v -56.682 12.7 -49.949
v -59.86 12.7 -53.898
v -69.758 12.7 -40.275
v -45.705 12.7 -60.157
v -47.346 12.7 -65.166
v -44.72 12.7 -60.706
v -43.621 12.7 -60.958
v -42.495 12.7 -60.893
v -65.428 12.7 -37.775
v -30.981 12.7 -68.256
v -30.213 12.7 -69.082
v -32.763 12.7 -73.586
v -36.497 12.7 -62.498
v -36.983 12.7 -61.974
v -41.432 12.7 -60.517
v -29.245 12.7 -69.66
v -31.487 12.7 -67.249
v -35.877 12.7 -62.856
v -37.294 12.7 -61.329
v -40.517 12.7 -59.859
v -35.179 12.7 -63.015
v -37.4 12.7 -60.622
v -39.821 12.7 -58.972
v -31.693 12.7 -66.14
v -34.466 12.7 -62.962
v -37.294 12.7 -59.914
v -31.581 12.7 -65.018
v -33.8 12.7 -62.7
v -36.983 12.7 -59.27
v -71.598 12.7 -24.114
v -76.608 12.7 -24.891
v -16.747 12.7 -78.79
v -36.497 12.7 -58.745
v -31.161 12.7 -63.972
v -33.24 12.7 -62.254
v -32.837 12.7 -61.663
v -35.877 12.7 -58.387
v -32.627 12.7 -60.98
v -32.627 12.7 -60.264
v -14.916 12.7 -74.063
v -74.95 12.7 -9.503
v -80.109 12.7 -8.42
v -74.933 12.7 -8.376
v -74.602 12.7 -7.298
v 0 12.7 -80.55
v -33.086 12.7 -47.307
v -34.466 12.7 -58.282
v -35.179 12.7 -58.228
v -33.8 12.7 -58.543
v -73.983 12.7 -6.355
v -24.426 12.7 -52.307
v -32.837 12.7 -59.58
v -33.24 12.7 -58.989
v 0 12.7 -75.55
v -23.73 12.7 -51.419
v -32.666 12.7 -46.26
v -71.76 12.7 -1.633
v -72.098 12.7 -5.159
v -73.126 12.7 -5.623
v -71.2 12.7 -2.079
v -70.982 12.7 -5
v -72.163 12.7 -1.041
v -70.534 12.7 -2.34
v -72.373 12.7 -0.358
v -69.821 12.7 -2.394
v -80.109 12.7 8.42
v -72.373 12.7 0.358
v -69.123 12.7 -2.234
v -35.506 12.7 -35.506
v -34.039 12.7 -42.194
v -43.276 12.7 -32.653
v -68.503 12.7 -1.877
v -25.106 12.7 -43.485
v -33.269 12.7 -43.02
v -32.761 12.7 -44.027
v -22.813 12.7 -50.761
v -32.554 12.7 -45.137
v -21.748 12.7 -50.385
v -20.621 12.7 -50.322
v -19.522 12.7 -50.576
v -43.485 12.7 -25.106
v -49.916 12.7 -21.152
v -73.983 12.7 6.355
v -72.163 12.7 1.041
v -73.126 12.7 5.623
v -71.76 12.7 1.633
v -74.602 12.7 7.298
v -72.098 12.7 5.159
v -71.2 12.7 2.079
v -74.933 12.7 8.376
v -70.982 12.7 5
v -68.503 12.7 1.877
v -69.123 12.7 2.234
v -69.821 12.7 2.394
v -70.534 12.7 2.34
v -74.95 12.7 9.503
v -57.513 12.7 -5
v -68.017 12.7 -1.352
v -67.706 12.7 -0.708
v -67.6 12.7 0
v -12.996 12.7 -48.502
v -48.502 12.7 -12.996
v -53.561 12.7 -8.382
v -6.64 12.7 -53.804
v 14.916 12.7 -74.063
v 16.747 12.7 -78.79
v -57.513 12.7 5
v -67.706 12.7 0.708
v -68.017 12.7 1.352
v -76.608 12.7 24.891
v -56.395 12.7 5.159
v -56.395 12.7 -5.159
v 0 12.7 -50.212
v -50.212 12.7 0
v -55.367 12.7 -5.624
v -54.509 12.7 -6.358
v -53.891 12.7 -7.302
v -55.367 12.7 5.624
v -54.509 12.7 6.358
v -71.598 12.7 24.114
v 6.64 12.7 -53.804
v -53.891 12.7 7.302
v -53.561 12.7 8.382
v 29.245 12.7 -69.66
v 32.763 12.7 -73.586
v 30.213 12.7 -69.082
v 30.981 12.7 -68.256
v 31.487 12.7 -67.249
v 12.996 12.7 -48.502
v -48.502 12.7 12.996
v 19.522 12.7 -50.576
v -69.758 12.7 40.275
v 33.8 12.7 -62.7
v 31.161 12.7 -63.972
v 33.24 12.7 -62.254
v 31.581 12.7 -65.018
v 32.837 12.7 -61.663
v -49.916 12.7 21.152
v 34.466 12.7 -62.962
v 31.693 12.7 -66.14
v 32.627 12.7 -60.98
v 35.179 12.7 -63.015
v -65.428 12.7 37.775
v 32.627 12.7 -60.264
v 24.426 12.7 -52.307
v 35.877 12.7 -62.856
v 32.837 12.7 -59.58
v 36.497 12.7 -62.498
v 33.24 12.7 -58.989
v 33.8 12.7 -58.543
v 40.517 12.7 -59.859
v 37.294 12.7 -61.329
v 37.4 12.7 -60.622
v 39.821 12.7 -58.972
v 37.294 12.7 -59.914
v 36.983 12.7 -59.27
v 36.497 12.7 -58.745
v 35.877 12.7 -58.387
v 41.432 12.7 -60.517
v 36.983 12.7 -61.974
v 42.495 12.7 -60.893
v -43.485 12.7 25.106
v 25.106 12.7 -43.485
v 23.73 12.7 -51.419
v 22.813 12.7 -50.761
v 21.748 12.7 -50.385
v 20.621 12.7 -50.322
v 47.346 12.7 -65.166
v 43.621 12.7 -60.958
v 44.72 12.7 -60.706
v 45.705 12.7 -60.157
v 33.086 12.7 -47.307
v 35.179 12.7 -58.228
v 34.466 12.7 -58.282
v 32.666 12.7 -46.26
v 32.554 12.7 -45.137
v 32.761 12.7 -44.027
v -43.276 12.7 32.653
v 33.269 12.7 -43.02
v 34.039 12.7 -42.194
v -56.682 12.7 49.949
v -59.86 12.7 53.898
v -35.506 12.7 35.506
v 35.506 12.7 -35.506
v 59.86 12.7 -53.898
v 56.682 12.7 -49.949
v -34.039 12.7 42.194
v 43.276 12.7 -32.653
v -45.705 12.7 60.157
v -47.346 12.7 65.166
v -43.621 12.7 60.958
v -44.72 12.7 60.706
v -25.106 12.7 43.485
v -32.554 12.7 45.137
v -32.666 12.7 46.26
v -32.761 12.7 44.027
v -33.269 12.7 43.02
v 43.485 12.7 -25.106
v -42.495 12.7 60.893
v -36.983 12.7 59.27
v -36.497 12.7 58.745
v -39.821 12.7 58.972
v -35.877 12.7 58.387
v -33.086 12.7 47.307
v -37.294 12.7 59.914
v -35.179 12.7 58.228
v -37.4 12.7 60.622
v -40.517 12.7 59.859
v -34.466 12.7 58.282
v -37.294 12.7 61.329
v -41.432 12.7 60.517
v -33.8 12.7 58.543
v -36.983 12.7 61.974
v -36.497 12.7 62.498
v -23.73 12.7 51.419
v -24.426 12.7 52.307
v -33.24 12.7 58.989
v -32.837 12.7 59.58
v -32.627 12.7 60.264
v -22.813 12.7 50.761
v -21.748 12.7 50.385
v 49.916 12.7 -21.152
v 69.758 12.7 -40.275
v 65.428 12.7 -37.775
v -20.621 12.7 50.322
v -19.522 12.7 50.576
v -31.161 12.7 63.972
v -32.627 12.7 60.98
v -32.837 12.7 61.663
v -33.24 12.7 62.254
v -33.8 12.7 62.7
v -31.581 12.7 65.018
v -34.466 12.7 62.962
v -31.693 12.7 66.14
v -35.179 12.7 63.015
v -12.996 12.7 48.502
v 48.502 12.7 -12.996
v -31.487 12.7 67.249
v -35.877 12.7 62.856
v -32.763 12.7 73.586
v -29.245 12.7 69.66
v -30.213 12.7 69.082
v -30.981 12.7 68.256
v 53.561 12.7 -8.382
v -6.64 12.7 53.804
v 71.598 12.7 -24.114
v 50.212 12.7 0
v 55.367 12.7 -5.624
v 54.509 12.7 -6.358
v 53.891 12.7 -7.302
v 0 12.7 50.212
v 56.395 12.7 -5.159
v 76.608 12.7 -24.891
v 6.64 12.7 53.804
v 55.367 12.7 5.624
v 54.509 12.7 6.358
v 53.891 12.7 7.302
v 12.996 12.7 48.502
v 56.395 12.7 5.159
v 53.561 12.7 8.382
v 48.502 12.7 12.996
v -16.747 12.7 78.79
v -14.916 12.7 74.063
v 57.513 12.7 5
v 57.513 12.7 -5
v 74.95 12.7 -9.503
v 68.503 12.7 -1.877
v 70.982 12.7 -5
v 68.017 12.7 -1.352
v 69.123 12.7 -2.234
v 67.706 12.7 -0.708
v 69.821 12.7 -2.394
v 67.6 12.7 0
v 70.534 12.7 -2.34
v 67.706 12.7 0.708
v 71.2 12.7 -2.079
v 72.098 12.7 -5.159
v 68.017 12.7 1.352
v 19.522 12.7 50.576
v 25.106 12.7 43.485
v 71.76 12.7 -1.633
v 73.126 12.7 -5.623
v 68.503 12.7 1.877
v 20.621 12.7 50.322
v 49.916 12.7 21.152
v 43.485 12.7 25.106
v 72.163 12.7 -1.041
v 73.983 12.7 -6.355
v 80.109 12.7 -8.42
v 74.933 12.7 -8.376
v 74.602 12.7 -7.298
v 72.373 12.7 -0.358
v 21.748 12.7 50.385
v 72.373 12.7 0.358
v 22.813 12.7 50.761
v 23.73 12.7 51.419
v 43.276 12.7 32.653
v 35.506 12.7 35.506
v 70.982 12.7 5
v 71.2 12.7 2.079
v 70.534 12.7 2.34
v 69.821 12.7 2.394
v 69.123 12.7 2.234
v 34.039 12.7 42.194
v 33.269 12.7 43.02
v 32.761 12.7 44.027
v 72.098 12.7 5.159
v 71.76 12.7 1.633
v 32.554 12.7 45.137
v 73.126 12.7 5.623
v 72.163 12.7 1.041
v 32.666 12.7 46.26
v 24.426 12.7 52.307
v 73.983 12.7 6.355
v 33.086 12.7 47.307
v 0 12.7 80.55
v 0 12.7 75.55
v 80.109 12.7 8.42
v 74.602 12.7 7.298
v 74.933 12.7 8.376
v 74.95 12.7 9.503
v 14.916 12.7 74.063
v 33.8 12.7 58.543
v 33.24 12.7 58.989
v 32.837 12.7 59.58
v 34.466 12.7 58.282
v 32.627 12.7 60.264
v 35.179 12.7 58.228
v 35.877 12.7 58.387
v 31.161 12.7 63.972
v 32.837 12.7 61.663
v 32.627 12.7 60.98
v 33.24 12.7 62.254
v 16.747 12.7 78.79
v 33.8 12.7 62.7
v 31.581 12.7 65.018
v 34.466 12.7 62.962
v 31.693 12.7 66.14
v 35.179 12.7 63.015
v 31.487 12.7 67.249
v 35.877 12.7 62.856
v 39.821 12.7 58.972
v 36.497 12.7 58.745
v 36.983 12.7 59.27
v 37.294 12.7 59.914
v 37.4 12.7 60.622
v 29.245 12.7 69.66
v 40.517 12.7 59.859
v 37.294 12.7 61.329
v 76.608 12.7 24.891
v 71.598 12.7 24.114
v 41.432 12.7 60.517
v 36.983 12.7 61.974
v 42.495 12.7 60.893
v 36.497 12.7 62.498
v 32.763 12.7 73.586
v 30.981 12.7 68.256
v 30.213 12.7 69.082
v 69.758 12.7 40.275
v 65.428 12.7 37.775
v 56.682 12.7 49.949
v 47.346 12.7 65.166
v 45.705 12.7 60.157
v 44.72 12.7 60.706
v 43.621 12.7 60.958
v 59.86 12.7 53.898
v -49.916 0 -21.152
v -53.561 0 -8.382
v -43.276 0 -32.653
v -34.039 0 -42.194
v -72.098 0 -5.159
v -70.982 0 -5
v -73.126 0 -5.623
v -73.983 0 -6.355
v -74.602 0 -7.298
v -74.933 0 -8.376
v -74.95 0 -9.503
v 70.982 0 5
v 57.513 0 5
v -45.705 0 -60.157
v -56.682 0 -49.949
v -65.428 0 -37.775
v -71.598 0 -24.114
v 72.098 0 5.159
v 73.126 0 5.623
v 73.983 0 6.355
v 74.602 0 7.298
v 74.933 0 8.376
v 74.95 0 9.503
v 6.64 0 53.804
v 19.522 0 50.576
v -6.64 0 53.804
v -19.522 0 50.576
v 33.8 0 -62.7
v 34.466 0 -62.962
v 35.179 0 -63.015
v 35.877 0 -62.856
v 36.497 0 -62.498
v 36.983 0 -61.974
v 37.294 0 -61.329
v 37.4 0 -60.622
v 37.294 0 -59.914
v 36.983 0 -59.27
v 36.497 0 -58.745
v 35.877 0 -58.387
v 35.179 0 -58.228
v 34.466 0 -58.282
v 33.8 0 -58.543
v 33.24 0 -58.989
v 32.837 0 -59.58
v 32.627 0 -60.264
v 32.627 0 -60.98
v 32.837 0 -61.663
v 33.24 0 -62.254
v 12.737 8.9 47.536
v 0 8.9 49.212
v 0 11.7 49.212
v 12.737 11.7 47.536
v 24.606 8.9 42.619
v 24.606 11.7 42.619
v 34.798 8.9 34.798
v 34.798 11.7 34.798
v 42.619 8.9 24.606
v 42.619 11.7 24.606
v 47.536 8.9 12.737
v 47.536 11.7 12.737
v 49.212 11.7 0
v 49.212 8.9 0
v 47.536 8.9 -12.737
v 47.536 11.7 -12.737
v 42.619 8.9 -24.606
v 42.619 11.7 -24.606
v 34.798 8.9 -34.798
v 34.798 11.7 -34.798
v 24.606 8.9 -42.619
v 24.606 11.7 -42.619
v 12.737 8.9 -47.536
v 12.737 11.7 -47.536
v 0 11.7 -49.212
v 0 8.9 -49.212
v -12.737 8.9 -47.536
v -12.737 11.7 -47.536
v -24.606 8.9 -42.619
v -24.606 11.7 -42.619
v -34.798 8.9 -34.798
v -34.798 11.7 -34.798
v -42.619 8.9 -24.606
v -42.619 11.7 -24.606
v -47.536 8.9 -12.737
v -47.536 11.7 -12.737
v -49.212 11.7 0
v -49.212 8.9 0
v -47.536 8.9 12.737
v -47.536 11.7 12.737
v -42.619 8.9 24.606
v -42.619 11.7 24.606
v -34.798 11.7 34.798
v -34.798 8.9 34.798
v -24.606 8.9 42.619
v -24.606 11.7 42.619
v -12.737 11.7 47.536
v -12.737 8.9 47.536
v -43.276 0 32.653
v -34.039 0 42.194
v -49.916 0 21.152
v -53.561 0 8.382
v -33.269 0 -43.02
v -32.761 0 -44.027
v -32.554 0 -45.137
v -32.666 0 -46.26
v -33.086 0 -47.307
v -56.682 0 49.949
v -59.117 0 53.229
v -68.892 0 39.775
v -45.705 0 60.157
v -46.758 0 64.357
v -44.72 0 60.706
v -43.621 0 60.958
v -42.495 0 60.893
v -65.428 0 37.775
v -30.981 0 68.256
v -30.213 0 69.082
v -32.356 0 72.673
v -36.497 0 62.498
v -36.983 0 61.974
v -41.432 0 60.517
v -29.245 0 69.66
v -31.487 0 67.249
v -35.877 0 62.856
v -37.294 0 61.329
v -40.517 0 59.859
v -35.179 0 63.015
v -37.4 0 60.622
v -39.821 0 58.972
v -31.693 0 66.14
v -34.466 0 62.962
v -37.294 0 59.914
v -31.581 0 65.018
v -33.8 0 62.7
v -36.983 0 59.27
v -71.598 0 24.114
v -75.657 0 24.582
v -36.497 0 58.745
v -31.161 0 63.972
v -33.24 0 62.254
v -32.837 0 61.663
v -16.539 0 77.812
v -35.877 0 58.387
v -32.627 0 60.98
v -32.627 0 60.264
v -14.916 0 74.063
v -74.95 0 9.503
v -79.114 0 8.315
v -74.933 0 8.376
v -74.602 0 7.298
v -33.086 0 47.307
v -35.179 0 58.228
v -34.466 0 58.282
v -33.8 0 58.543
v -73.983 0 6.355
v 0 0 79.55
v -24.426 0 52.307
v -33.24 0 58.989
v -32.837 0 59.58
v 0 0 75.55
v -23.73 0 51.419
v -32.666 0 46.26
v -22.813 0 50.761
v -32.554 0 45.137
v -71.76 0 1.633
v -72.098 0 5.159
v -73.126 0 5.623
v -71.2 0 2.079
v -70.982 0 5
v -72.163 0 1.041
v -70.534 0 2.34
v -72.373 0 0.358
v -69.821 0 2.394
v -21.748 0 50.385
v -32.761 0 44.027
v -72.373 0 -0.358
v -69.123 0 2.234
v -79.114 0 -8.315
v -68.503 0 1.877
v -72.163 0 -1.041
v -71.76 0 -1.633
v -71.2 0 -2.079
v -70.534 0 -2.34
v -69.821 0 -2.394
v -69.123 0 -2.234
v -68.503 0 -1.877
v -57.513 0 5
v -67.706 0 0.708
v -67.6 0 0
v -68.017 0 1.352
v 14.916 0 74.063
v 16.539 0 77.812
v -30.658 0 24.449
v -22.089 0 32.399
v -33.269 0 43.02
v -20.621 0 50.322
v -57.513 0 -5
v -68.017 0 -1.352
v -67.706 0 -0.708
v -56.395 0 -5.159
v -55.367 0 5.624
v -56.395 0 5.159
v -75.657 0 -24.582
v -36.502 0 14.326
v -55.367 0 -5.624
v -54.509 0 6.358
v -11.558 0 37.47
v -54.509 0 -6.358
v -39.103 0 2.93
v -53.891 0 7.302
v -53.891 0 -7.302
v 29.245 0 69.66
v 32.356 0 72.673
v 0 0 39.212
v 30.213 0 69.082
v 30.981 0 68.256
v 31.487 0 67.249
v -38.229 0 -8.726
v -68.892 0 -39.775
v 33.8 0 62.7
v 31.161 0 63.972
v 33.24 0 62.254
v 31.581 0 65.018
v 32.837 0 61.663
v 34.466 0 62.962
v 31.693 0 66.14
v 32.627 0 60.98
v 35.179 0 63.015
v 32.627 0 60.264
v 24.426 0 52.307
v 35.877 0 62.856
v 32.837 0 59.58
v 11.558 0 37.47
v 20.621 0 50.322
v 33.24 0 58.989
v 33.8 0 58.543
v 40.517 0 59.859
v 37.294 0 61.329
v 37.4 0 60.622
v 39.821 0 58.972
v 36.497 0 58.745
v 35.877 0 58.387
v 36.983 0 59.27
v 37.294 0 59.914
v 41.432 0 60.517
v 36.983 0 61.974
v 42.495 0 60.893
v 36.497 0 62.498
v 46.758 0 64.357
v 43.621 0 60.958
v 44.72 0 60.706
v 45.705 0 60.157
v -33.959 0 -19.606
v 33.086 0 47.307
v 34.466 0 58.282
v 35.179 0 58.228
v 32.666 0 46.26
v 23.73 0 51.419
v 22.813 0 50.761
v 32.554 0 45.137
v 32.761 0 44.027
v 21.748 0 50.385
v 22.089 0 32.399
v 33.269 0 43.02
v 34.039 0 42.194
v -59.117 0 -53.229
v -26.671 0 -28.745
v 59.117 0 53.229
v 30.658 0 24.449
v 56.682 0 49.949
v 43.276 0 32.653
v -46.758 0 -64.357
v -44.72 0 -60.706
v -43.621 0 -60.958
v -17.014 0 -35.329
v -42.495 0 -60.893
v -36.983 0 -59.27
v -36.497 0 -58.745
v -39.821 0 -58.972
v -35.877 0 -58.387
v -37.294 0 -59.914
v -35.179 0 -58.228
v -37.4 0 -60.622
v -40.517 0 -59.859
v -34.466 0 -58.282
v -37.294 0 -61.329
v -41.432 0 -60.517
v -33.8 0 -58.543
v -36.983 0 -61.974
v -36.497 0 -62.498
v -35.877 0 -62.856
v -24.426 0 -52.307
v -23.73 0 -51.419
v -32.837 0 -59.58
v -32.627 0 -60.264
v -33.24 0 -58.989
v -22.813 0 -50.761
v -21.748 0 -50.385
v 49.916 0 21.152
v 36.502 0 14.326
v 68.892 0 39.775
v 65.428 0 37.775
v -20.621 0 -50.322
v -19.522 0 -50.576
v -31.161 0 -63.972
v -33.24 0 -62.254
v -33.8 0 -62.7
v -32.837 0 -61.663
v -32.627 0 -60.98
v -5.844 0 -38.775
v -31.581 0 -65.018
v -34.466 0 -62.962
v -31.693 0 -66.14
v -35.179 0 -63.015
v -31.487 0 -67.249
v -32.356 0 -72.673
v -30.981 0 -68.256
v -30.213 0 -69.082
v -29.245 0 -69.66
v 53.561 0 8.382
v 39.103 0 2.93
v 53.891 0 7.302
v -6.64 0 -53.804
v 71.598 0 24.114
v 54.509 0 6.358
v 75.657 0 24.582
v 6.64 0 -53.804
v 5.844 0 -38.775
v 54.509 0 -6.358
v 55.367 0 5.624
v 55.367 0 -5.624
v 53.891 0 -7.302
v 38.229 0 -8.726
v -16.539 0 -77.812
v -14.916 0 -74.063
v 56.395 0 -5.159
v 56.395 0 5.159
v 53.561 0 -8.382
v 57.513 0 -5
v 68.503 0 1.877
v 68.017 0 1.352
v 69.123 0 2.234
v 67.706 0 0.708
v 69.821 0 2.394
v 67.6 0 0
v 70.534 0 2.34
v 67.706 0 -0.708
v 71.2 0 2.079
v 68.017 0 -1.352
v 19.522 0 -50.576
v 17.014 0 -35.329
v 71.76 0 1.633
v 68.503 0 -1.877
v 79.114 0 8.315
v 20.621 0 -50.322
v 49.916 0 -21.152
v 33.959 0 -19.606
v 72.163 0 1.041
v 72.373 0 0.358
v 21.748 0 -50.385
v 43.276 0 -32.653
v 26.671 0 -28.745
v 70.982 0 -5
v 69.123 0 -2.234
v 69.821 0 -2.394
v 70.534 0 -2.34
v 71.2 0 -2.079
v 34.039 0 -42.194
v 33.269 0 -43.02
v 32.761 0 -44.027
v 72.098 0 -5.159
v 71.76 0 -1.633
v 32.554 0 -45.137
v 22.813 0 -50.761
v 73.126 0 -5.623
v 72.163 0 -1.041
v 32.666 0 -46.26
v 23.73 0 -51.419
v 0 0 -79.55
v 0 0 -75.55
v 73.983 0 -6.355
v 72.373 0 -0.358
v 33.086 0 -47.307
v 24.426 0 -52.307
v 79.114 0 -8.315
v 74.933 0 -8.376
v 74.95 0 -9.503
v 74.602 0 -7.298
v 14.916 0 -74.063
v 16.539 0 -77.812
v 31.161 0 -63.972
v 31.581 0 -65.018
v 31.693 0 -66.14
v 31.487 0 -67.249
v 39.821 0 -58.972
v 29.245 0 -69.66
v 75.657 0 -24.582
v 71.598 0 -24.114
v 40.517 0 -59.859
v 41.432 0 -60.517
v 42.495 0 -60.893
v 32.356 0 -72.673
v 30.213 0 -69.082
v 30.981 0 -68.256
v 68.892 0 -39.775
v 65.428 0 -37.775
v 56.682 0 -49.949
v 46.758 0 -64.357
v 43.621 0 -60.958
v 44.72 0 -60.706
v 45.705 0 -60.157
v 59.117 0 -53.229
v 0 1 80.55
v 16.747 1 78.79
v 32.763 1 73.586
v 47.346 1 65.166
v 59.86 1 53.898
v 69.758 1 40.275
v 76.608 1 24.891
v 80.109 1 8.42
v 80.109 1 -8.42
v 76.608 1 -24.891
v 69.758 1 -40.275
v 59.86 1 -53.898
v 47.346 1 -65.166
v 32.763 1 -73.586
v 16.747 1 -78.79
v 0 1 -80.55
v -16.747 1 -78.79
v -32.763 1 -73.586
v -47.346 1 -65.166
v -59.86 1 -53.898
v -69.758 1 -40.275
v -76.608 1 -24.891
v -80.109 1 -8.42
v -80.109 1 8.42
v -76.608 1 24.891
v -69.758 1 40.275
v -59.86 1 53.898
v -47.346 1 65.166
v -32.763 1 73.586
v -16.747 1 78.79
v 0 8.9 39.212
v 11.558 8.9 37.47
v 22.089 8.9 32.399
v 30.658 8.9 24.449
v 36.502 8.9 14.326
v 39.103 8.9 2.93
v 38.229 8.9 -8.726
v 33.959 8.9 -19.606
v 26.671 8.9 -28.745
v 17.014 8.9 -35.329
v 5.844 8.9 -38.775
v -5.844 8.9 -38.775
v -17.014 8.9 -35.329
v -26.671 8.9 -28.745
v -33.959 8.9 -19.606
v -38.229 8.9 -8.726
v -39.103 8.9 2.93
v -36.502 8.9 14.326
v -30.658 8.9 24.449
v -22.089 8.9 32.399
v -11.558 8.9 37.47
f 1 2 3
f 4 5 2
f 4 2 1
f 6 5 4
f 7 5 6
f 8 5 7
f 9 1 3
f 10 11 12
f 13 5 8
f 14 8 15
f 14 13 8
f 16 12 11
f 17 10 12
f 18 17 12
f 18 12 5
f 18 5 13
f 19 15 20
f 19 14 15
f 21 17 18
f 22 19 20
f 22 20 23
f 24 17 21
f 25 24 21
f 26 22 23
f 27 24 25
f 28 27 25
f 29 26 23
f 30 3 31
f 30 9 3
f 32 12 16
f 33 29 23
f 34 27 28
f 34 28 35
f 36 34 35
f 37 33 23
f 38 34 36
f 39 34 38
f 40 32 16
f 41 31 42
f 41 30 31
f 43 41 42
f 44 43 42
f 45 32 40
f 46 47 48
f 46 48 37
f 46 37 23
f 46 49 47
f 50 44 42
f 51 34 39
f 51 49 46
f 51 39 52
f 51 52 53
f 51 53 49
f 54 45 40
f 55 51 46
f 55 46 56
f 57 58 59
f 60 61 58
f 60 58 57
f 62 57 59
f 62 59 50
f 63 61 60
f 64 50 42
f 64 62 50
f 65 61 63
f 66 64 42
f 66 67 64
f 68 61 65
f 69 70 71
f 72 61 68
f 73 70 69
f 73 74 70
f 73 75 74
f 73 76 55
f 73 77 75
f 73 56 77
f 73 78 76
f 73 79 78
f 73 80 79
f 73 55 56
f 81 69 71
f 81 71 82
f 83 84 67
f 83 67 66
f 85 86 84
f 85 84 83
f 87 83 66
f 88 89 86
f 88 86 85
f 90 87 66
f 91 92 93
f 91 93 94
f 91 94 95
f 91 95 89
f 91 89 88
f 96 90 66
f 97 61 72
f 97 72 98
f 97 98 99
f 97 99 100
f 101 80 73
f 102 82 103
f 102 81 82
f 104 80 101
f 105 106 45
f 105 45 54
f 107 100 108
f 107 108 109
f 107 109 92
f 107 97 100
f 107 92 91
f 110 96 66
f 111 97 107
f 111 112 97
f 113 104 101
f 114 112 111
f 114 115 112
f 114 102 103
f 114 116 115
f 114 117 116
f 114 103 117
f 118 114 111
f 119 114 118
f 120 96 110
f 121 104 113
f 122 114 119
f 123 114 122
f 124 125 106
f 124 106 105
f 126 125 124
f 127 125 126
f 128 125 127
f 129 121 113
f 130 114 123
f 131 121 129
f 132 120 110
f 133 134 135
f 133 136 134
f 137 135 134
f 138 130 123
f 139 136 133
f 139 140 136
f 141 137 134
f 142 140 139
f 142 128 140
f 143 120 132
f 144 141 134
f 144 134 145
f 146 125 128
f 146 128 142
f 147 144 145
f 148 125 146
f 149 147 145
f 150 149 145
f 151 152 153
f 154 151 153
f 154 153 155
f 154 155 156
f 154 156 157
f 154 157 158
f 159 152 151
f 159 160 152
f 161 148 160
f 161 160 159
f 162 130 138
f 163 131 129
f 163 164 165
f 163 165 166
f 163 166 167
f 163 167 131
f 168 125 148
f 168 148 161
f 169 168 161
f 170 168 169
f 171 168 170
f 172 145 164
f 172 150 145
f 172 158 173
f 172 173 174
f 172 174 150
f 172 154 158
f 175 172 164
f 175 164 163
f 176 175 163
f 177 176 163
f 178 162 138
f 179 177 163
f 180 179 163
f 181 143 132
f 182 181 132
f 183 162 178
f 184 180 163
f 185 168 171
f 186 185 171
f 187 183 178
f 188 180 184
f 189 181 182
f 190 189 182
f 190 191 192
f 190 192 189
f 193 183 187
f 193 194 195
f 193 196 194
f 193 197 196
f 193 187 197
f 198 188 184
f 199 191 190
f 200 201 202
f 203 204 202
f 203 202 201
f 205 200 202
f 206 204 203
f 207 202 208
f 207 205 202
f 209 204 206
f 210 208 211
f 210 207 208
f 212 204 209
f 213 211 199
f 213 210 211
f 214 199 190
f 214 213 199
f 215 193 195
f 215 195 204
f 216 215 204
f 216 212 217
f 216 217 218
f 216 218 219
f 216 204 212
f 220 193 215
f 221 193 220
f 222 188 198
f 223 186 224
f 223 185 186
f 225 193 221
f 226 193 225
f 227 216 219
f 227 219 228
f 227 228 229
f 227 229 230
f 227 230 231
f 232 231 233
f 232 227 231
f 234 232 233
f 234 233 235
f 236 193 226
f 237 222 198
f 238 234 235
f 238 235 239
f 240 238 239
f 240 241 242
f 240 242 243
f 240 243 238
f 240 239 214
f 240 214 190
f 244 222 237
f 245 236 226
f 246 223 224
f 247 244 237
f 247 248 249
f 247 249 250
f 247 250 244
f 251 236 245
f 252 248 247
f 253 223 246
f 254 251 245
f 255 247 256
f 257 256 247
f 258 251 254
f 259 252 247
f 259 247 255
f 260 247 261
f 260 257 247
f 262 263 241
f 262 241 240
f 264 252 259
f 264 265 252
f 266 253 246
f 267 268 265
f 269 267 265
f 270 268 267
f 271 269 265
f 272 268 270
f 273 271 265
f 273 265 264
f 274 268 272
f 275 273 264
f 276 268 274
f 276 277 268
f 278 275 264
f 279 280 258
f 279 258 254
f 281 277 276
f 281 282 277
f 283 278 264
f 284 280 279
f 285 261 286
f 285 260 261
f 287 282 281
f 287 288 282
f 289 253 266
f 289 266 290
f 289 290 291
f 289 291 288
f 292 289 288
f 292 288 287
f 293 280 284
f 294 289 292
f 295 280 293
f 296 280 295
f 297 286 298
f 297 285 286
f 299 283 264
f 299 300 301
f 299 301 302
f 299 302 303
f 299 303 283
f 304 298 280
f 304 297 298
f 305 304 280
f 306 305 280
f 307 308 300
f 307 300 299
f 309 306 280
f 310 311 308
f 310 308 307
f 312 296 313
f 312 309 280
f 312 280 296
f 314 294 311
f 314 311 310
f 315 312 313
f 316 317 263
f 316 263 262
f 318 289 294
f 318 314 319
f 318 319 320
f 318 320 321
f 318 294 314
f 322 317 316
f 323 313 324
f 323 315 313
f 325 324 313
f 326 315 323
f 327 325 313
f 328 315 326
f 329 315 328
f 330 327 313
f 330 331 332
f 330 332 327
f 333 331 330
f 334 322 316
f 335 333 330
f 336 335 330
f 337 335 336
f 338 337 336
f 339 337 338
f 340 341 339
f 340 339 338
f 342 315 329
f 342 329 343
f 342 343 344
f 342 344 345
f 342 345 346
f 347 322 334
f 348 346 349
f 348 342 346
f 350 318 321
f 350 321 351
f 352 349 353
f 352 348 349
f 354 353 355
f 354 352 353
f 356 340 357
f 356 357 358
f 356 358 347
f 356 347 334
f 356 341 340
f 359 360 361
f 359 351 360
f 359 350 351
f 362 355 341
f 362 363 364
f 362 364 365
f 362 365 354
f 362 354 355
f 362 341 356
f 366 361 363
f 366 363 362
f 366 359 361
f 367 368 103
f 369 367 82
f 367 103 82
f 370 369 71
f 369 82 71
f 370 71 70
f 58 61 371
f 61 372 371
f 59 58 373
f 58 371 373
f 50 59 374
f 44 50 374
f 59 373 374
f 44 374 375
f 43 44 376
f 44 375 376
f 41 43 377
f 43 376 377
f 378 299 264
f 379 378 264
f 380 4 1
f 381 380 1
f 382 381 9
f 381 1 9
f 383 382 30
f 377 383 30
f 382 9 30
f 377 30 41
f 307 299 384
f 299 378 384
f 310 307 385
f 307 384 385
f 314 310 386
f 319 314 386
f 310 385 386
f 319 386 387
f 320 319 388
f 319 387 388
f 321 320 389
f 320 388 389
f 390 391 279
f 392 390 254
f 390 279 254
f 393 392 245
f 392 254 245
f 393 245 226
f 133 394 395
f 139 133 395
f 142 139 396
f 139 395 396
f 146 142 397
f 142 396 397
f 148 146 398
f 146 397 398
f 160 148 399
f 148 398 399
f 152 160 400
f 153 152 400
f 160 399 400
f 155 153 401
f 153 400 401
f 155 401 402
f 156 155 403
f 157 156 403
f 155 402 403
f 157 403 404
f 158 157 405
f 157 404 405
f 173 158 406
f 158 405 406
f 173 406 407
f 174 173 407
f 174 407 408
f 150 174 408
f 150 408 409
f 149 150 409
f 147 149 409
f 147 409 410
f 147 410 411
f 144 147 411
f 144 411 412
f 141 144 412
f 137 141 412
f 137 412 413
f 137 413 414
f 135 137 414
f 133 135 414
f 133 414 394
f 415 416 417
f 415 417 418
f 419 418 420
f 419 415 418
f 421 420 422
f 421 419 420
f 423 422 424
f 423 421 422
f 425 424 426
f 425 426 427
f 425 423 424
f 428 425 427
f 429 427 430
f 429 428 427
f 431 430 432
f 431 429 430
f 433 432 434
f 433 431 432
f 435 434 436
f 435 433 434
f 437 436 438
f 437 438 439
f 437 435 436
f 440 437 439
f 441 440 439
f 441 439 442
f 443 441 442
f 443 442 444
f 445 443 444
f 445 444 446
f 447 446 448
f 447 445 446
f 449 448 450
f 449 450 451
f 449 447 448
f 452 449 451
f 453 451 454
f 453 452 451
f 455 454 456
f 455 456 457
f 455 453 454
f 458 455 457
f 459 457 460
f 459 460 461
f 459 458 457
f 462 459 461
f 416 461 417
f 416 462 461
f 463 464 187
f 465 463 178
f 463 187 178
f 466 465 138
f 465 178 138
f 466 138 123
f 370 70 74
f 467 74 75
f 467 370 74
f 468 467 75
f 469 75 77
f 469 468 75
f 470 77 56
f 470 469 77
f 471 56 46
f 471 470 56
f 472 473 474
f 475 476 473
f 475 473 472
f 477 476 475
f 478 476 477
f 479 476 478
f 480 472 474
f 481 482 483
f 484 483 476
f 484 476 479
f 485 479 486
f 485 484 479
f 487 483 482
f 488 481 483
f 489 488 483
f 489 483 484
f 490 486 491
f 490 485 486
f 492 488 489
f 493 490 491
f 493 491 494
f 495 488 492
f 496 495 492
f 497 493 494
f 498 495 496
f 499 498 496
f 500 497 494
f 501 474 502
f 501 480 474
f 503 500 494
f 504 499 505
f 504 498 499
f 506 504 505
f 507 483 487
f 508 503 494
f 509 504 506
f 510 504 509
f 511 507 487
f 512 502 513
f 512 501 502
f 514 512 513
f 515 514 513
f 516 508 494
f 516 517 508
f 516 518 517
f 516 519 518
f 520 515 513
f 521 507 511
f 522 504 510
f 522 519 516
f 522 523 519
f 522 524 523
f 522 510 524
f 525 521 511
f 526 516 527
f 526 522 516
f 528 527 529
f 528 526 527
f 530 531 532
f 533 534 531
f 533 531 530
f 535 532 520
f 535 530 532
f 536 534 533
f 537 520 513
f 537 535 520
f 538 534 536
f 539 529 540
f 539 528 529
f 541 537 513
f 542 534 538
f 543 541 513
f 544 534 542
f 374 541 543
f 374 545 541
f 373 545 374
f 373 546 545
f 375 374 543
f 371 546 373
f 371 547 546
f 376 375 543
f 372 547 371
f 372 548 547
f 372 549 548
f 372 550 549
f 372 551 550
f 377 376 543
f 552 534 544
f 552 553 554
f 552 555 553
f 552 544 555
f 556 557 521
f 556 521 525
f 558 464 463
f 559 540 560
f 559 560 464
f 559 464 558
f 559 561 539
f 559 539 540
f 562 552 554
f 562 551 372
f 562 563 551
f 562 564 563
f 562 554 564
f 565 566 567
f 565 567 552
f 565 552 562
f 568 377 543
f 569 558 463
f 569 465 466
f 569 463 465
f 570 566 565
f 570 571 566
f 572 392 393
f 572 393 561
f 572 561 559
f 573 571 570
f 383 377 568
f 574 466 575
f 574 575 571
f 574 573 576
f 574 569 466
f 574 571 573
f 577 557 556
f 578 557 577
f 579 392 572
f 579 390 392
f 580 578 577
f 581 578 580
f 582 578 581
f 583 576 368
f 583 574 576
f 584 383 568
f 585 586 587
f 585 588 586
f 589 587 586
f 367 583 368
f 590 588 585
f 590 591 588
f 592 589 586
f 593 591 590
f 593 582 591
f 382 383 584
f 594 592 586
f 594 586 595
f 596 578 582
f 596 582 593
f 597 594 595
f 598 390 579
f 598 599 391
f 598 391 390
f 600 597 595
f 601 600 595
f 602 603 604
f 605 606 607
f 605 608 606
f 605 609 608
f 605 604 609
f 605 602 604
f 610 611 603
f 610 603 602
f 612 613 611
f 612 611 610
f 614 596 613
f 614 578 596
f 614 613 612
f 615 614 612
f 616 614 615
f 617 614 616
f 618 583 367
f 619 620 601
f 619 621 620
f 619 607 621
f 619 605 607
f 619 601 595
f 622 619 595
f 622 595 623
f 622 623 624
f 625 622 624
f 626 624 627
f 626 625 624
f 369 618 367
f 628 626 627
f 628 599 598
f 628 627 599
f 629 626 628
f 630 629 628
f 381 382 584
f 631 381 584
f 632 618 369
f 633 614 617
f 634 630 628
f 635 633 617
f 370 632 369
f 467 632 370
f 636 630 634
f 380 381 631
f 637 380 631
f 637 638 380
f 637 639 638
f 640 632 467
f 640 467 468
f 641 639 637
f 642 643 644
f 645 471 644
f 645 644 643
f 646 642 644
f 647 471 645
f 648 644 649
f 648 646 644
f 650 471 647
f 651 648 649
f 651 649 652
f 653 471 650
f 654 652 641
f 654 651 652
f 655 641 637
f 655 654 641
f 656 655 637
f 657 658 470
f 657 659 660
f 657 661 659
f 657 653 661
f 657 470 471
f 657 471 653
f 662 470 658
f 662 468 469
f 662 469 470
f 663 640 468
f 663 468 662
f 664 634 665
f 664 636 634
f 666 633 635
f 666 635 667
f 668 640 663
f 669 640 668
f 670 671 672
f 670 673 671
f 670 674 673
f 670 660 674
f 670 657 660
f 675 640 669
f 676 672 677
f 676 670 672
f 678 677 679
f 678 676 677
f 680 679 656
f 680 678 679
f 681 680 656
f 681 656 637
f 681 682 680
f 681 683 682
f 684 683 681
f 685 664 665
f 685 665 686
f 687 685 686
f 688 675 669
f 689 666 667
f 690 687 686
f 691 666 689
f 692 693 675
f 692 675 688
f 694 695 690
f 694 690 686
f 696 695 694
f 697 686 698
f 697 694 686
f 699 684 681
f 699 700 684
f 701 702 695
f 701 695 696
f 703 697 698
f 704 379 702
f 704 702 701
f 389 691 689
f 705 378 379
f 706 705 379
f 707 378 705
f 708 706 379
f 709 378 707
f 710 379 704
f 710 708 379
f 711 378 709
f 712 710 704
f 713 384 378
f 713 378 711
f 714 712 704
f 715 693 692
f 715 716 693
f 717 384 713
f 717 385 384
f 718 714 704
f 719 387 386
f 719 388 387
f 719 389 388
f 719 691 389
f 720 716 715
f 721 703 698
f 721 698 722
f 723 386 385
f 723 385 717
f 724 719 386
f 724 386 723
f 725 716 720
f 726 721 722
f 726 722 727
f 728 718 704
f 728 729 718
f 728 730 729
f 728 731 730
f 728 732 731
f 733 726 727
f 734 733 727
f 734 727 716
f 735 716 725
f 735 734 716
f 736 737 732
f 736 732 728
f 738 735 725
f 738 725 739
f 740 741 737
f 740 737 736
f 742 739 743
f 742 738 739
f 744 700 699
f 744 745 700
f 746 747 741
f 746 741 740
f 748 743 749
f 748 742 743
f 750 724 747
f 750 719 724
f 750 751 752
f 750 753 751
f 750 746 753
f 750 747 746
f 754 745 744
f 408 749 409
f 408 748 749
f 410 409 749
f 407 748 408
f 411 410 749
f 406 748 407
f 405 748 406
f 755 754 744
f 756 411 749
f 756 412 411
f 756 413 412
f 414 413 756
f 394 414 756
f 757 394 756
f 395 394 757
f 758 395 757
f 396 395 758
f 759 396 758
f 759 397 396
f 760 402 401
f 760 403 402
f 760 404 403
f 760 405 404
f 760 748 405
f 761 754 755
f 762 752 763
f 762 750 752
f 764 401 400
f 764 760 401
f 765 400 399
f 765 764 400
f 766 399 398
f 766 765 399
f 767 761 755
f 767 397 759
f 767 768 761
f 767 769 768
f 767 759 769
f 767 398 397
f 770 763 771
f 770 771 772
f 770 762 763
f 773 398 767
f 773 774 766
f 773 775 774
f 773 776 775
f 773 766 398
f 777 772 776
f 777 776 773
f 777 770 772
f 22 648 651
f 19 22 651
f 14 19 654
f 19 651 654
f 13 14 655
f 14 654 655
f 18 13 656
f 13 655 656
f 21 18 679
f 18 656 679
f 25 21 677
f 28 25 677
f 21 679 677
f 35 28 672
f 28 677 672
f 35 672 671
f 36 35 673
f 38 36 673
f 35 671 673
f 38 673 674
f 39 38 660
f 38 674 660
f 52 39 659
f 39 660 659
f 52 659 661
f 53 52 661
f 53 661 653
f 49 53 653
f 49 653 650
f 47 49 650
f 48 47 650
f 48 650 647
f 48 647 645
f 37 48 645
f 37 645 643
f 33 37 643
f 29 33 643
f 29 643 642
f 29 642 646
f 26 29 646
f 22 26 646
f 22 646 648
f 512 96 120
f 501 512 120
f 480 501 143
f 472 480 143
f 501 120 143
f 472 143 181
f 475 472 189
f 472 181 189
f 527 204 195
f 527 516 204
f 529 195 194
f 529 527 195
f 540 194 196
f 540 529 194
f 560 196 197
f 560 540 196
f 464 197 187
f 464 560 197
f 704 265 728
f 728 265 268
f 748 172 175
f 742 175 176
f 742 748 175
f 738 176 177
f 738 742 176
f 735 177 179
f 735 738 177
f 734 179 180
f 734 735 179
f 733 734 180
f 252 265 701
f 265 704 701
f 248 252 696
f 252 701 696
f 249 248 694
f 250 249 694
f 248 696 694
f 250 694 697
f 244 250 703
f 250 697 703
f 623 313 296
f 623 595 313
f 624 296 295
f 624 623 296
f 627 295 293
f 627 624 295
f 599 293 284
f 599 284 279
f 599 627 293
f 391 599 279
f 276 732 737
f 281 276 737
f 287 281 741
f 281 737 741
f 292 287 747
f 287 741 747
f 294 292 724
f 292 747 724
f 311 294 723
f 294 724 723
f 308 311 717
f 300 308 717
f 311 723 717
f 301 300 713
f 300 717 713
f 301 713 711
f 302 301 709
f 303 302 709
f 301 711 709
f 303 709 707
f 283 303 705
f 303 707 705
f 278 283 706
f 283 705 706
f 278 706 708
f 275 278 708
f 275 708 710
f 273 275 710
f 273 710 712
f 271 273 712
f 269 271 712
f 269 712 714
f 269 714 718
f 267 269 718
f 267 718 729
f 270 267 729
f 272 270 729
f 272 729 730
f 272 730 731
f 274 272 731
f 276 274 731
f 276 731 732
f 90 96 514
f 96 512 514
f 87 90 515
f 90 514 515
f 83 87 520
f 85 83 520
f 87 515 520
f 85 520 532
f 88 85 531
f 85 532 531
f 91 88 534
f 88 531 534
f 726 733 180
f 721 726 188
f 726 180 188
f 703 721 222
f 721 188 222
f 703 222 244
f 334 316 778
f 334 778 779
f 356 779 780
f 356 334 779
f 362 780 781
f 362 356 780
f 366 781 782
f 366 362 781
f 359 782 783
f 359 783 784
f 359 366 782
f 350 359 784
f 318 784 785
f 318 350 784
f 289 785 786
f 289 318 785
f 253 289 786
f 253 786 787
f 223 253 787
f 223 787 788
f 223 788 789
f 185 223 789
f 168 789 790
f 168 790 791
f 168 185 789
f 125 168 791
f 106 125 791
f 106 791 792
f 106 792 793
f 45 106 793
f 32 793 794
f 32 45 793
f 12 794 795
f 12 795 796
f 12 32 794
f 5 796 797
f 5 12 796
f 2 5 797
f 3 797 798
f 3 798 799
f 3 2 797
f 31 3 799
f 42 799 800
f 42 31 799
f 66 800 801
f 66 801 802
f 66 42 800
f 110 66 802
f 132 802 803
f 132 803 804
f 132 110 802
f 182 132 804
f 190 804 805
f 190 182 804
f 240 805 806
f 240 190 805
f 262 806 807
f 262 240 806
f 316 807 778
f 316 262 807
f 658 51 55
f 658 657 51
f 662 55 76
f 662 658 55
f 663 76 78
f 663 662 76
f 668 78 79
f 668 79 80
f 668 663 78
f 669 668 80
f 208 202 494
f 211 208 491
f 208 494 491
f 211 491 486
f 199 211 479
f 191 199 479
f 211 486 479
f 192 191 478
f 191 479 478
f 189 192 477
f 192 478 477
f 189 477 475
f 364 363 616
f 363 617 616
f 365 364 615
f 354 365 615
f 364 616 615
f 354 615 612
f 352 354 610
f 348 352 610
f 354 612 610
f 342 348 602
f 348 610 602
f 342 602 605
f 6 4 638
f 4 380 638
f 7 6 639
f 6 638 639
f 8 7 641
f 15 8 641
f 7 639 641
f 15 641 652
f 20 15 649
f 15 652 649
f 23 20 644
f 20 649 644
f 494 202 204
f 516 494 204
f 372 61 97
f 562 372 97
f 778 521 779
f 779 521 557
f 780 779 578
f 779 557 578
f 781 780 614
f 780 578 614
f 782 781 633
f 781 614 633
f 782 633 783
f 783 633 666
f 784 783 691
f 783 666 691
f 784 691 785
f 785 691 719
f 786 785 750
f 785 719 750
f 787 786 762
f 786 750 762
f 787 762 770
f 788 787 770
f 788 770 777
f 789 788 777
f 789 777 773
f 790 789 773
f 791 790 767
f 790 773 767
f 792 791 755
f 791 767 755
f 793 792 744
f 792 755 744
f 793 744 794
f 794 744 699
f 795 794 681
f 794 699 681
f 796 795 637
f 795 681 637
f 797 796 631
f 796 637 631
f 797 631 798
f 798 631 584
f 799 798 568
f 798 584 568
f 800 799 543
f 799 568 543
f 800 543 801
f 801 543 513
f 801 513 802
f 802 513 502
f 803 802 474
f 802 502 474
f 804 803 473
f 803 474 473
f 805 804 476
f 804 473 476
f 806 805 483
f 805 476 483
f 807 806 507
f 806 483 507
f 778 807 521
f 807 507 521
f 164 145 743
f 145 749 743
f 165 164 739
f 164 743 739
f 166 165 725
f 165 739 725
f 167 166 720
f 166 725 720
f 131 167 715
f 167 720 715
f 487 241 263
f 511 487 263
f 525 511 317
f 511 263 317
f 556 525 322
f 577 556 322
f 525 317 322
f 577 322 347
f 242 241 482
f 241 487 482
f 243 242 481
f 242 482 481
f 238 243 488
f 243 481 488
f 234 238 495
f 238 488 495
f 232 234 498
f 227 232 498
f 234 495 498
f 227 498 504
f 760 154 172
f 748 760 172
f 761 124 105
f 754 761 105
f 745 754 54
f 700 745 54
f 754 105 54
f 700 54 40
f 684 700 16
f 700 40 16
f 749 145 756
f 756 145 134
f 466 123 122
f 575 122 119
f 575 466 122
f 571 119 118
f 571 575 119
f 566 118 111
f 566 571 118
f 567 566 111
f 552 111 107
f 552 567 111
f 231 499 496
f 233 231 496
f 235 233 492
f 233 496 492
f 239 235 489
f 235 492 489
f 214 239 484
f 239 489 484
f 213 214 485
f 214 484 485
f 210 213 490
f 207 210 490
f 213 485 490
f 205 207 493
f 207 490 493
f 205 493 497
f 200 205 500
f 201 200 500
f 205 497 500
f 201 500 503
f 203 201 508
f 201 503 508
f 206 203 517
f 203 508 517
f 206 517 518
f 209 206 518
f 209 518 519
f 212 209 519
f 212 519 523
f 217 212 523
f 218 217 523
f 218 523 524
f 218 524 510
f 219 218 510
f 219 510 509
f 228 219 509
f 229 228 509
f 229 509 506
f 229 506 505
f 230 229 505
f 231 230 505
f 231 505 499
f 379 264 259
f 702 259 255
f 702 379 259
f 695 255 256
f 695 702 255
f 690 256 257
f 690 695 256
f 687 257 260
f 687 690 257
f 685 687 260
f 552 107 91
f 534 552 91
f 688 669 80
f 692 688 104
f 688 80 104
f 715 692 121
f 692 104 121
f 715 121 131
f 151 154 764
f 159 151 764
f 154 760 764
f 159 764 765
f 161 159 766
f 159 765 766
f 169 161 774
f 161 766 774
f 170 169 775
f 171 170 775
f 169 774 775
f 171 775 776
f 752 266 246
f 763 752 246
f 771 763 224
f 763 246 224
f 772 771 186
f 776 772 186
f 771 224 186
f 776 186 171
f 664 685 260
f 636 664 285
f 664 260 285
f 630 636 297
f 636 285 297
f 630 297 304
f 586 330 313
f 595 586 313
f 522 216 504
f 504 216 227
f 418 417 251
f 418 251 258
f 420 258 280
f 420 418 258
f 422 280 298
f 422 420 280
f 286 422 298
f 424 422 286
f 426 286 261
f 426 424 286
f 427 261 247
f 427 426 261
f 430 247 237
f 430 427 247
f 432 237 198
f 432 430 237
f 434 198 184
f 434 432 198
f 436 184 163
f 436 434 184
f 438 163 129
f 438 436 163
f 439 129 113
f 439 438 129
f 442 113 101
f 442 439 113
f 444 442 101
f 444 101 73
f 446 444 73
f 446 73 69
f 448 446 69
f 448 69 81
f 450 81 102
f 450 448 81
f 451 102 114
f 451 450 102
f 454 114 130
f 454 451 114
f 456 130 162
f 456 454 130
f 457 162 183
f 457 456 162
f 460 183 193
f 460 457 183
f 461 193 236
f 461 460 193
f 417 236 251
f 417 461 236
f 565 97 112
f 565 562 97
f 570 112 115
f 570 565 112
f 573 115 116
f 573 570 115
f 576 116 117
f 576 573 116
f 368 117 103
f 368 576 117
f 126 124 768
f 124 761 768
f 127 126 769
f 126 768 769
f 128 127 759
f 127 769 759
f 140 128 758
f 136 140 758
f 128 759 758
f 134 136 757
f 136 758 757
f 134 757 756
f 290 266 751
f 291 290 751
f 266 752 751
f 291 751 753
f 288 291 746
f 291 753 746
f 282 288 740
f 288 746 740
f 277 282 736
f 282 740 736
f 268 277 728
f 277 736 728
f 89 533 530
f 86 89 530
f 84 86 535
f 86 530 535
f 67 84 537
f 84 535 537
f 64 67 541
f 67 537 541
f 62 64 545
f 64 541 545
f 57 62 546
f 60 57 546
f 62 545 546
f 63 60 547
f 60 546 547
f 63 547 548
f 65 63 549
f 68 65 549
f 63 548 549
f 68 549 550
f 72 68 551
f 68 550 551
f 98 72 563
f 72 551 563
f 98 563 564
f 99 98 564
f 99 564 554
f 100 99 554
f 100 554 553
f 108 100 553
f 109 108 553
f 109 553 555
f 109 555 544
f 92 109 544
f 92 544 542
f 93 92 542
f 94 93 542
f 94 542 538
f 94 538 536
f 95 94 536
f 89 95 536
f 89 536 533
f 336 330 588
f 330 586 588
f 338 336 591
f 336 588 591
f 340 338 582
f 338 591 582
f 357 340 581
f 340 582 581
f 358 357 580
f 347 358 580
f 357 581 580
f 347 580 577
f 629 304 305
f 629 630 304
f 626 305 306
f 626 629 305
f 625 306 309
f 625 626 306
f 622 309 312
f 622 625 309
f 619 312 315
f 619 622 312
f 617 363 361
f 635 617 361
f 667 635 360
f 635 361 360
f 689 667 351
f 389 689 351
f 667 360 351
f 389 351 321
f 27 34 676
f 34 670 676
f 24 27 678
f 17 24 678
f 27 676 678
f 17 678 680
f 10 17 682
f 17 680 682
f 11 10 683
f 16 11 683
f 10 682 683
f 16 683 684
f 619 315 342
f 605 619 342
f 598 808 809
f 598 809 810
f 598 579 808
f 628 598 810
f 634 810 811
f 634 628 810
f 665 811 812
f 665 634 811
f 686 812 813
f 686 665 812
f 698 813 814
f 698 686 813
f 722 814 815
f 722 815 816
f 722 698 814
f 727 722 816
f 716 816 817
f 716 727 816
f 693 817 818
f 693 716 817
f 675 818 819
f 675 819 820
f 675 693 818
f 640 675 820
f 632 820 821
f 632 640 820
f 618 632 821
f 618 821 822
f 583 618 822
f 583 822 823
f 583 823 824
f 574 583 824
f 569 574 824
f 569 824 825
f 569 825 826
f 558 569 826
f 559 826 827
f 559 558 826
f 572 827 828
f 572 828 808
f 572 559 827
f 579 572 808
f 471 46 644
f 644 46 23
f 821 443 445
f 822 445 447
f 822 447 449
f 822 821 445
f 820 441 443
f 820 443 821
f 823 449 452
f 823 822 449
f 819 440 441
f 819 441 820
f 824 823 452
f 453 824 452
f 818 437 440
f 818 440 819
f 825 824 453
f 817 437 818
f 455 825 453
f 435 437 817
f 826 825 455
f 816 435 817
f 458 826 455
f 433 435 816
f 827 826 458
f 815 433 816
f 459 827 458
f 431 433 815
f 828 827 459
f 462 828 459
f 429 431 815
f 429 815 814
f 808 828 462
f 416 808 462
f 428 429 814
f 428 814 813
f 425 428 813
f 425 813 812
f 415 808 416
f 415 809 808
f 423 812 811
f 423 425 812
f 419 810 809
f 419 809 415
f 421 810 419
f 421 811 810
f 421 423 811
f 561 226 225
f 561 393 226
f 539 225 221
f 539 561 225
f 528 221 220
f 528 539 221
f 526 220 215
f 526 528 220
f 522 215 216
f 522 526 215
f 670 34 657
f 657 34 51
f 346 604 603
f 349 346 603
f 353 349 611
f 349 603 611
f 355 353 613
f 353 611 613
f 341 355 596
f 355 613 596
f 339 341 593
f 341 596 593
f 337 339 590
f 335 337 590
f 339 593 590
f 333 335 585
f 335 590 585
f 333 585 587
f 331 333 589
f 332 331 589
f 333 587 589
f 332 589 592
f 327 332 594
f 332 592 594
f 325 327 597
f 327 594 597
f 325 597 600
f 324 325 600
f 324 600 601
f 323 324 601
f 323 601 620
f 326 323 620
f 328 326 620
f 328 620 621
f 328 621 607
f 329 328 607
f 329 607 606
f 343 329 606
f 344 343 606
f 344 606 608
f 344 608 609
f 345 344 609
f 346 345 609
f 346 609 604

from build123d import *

# Parameters (mm, degrees)
F_12_0_189_DIAMETER_HOLE1_D = 4.8006
CIRPATTERN3_COUNT           = 6
CUT_EXTRUDE1_DEPTH          = 13.7
FILLET1_R                   = 4
CIRPATTERN4_COUNT           = 6
FILLET1_OF_CIRPATTERN4_R    = 4
CHAMFER1_SIZE               = 1
CHAMFER2_SIZE               = 1


with BuildPart() as part:
    # Sketch2 → Revolve1 (revolve)
    with BuildSketch(Plane(origin=(0, 0, 0), x_dir=(0, 0, -1), z_dir=(1, 0, 0))):
        Polygon((-39.2125, 0), (-80.55, 0), (-80.55, 12.7), (-49.2125, 12.7), (-49.2125, 8.9), (-39.2125, 8.9), align=None)
    revolve(axis=Axis((0, -0.635, 0), (0, 1, 0)))

    # #12 (0.189) Diameter Hole1 (through all)
    with Locations(Plane(origin=(0, 12.7, 0), x_dir=(1, 0, 0), z_dir=(0, 1, 0))):
        with Locations((-35, 60.621778)):
            f_12_0_189_diameter_hole1 = Hole(F_12_0_189_DIAMETER_HOLE1_D / 2)

    # CirPattern3: #12 (0.189) Diameter Hole1 ×6 about axis
    cirpattern3_axis = Axis((0, 0, 0), (0, 1, 0))
    for i in range(1, CIRPATTERN3_COUNT):
        add(f_12_0_189_diameter_hole1.rotate(cirpattern3_axis, i * 360 / CIRPATTERN3_COUNT), mode=Mode.SUBTRACT)

    # Sketch8 → Cut-Extrude1 (cut, through all)
    with BuildSketch(Plane(origin=(0, 12.7, 0), x_dir=(1, 0, 0), z_dir=(0, 1, 0))):
        with BuildLine():
            Line((-33.362056, 67.784775), (-22.66059, 49.249293))
            ThreePointArc((-22.66059, 49.249293), (0, 54.2125), (22.66059, 49.249293))
            Line((22.66059, 49.249293), (33.362056, 67.784775))
            ThreePointArc((33.362056, 67.784775), (0, 75.55), (-33.362056, 67.784775))
        make_face()
    cut_extrude1 = extrude(amount=-CUT_EXTRUDE1_DEPTH, mode=Mode.SUBTRACT)

    # Fillet1
    fillet1_edges = [part.edges().sort_by_distance(p)[0] for p in [
        (22.66059, 6.35, -49.249293),
        (-22.66059, 6.35, -49.249293),
        (-33.362056, 6.35, -67.784775),
        (33.362056, 6.35, -67.784775),
    ]]
    fillet(fillet1_edges, radius=FILLET1_R)

    # CirPattern4: Cut-Extrude1 ×6 about axis
    cirpattern4_axis = Axis((0, 0, 0), (0, 1, 0))
    for i in range(1, CIRPATTERN4_COUNT):
        add(cut_extrude1.rotate(cirpattern4_axis, i * 360 / CIRPATTERN4_COUNT), mode=Mode.SUBTRACT)

    # Fillet1 of CirPattern4
    fillet1_of_cirpattern4_edges = [part.edges().sort_by_distance(p)[0] for p in [
        (-31.320844, 6.35, -44.249293),
        (-53.981433, 6.35, -5),
        (-75.384365, 6.35, -5),
        (-42.02231, 6.35, -62.784775),
        (-53.981433, 6.35, 5),
        (-31.320844, 6.35, 44.249293),
        (-42.02231, 6.35, 62.784775),
        (-75.384365, 6.35, 5),
        (-22.66059, 6.35, 49.249293),
        (22.66059, 6.35, 49.249293),
        (33.362056, 6.35, 67.784775),
        (-33.362056, 6.35, 67.784775),
        (31.320844, 6.35, 44.249293),
        (53.981433, 6.35, 5),
        (75.384365, 6.35, 5),
        (42.02231, 6.35, 62.784775),
        (53.981433, 6.35, -5),
        (31.320844, 6.35, -44.249293),
        (42.02231, 6.35, -62.784775),
        (75.384365, 6.35, -5),
    ]]
    fillet(fillet1_of_cirpattern4_edges, radius=FILLET1_OF_CIRPATTERN4_R)

    # Chamfer1
    chamfer1_edges = [part.edges().sort_by_distance(p)[0] for p in [
        (0, 12.7, -49.2125),
    ]]
    chamfer(chamfer1_edges, length=CHAMFER1_SIZE)

    # Chamfer2
    chamfer2_edges = [part.edges().sort_by_distance(p)[0] for p in [
        (0, 0, -80.55),
    ]]
    chamfer(chamfer2_edges, length=CHAMFER2_SIZE)


solid = part.part
